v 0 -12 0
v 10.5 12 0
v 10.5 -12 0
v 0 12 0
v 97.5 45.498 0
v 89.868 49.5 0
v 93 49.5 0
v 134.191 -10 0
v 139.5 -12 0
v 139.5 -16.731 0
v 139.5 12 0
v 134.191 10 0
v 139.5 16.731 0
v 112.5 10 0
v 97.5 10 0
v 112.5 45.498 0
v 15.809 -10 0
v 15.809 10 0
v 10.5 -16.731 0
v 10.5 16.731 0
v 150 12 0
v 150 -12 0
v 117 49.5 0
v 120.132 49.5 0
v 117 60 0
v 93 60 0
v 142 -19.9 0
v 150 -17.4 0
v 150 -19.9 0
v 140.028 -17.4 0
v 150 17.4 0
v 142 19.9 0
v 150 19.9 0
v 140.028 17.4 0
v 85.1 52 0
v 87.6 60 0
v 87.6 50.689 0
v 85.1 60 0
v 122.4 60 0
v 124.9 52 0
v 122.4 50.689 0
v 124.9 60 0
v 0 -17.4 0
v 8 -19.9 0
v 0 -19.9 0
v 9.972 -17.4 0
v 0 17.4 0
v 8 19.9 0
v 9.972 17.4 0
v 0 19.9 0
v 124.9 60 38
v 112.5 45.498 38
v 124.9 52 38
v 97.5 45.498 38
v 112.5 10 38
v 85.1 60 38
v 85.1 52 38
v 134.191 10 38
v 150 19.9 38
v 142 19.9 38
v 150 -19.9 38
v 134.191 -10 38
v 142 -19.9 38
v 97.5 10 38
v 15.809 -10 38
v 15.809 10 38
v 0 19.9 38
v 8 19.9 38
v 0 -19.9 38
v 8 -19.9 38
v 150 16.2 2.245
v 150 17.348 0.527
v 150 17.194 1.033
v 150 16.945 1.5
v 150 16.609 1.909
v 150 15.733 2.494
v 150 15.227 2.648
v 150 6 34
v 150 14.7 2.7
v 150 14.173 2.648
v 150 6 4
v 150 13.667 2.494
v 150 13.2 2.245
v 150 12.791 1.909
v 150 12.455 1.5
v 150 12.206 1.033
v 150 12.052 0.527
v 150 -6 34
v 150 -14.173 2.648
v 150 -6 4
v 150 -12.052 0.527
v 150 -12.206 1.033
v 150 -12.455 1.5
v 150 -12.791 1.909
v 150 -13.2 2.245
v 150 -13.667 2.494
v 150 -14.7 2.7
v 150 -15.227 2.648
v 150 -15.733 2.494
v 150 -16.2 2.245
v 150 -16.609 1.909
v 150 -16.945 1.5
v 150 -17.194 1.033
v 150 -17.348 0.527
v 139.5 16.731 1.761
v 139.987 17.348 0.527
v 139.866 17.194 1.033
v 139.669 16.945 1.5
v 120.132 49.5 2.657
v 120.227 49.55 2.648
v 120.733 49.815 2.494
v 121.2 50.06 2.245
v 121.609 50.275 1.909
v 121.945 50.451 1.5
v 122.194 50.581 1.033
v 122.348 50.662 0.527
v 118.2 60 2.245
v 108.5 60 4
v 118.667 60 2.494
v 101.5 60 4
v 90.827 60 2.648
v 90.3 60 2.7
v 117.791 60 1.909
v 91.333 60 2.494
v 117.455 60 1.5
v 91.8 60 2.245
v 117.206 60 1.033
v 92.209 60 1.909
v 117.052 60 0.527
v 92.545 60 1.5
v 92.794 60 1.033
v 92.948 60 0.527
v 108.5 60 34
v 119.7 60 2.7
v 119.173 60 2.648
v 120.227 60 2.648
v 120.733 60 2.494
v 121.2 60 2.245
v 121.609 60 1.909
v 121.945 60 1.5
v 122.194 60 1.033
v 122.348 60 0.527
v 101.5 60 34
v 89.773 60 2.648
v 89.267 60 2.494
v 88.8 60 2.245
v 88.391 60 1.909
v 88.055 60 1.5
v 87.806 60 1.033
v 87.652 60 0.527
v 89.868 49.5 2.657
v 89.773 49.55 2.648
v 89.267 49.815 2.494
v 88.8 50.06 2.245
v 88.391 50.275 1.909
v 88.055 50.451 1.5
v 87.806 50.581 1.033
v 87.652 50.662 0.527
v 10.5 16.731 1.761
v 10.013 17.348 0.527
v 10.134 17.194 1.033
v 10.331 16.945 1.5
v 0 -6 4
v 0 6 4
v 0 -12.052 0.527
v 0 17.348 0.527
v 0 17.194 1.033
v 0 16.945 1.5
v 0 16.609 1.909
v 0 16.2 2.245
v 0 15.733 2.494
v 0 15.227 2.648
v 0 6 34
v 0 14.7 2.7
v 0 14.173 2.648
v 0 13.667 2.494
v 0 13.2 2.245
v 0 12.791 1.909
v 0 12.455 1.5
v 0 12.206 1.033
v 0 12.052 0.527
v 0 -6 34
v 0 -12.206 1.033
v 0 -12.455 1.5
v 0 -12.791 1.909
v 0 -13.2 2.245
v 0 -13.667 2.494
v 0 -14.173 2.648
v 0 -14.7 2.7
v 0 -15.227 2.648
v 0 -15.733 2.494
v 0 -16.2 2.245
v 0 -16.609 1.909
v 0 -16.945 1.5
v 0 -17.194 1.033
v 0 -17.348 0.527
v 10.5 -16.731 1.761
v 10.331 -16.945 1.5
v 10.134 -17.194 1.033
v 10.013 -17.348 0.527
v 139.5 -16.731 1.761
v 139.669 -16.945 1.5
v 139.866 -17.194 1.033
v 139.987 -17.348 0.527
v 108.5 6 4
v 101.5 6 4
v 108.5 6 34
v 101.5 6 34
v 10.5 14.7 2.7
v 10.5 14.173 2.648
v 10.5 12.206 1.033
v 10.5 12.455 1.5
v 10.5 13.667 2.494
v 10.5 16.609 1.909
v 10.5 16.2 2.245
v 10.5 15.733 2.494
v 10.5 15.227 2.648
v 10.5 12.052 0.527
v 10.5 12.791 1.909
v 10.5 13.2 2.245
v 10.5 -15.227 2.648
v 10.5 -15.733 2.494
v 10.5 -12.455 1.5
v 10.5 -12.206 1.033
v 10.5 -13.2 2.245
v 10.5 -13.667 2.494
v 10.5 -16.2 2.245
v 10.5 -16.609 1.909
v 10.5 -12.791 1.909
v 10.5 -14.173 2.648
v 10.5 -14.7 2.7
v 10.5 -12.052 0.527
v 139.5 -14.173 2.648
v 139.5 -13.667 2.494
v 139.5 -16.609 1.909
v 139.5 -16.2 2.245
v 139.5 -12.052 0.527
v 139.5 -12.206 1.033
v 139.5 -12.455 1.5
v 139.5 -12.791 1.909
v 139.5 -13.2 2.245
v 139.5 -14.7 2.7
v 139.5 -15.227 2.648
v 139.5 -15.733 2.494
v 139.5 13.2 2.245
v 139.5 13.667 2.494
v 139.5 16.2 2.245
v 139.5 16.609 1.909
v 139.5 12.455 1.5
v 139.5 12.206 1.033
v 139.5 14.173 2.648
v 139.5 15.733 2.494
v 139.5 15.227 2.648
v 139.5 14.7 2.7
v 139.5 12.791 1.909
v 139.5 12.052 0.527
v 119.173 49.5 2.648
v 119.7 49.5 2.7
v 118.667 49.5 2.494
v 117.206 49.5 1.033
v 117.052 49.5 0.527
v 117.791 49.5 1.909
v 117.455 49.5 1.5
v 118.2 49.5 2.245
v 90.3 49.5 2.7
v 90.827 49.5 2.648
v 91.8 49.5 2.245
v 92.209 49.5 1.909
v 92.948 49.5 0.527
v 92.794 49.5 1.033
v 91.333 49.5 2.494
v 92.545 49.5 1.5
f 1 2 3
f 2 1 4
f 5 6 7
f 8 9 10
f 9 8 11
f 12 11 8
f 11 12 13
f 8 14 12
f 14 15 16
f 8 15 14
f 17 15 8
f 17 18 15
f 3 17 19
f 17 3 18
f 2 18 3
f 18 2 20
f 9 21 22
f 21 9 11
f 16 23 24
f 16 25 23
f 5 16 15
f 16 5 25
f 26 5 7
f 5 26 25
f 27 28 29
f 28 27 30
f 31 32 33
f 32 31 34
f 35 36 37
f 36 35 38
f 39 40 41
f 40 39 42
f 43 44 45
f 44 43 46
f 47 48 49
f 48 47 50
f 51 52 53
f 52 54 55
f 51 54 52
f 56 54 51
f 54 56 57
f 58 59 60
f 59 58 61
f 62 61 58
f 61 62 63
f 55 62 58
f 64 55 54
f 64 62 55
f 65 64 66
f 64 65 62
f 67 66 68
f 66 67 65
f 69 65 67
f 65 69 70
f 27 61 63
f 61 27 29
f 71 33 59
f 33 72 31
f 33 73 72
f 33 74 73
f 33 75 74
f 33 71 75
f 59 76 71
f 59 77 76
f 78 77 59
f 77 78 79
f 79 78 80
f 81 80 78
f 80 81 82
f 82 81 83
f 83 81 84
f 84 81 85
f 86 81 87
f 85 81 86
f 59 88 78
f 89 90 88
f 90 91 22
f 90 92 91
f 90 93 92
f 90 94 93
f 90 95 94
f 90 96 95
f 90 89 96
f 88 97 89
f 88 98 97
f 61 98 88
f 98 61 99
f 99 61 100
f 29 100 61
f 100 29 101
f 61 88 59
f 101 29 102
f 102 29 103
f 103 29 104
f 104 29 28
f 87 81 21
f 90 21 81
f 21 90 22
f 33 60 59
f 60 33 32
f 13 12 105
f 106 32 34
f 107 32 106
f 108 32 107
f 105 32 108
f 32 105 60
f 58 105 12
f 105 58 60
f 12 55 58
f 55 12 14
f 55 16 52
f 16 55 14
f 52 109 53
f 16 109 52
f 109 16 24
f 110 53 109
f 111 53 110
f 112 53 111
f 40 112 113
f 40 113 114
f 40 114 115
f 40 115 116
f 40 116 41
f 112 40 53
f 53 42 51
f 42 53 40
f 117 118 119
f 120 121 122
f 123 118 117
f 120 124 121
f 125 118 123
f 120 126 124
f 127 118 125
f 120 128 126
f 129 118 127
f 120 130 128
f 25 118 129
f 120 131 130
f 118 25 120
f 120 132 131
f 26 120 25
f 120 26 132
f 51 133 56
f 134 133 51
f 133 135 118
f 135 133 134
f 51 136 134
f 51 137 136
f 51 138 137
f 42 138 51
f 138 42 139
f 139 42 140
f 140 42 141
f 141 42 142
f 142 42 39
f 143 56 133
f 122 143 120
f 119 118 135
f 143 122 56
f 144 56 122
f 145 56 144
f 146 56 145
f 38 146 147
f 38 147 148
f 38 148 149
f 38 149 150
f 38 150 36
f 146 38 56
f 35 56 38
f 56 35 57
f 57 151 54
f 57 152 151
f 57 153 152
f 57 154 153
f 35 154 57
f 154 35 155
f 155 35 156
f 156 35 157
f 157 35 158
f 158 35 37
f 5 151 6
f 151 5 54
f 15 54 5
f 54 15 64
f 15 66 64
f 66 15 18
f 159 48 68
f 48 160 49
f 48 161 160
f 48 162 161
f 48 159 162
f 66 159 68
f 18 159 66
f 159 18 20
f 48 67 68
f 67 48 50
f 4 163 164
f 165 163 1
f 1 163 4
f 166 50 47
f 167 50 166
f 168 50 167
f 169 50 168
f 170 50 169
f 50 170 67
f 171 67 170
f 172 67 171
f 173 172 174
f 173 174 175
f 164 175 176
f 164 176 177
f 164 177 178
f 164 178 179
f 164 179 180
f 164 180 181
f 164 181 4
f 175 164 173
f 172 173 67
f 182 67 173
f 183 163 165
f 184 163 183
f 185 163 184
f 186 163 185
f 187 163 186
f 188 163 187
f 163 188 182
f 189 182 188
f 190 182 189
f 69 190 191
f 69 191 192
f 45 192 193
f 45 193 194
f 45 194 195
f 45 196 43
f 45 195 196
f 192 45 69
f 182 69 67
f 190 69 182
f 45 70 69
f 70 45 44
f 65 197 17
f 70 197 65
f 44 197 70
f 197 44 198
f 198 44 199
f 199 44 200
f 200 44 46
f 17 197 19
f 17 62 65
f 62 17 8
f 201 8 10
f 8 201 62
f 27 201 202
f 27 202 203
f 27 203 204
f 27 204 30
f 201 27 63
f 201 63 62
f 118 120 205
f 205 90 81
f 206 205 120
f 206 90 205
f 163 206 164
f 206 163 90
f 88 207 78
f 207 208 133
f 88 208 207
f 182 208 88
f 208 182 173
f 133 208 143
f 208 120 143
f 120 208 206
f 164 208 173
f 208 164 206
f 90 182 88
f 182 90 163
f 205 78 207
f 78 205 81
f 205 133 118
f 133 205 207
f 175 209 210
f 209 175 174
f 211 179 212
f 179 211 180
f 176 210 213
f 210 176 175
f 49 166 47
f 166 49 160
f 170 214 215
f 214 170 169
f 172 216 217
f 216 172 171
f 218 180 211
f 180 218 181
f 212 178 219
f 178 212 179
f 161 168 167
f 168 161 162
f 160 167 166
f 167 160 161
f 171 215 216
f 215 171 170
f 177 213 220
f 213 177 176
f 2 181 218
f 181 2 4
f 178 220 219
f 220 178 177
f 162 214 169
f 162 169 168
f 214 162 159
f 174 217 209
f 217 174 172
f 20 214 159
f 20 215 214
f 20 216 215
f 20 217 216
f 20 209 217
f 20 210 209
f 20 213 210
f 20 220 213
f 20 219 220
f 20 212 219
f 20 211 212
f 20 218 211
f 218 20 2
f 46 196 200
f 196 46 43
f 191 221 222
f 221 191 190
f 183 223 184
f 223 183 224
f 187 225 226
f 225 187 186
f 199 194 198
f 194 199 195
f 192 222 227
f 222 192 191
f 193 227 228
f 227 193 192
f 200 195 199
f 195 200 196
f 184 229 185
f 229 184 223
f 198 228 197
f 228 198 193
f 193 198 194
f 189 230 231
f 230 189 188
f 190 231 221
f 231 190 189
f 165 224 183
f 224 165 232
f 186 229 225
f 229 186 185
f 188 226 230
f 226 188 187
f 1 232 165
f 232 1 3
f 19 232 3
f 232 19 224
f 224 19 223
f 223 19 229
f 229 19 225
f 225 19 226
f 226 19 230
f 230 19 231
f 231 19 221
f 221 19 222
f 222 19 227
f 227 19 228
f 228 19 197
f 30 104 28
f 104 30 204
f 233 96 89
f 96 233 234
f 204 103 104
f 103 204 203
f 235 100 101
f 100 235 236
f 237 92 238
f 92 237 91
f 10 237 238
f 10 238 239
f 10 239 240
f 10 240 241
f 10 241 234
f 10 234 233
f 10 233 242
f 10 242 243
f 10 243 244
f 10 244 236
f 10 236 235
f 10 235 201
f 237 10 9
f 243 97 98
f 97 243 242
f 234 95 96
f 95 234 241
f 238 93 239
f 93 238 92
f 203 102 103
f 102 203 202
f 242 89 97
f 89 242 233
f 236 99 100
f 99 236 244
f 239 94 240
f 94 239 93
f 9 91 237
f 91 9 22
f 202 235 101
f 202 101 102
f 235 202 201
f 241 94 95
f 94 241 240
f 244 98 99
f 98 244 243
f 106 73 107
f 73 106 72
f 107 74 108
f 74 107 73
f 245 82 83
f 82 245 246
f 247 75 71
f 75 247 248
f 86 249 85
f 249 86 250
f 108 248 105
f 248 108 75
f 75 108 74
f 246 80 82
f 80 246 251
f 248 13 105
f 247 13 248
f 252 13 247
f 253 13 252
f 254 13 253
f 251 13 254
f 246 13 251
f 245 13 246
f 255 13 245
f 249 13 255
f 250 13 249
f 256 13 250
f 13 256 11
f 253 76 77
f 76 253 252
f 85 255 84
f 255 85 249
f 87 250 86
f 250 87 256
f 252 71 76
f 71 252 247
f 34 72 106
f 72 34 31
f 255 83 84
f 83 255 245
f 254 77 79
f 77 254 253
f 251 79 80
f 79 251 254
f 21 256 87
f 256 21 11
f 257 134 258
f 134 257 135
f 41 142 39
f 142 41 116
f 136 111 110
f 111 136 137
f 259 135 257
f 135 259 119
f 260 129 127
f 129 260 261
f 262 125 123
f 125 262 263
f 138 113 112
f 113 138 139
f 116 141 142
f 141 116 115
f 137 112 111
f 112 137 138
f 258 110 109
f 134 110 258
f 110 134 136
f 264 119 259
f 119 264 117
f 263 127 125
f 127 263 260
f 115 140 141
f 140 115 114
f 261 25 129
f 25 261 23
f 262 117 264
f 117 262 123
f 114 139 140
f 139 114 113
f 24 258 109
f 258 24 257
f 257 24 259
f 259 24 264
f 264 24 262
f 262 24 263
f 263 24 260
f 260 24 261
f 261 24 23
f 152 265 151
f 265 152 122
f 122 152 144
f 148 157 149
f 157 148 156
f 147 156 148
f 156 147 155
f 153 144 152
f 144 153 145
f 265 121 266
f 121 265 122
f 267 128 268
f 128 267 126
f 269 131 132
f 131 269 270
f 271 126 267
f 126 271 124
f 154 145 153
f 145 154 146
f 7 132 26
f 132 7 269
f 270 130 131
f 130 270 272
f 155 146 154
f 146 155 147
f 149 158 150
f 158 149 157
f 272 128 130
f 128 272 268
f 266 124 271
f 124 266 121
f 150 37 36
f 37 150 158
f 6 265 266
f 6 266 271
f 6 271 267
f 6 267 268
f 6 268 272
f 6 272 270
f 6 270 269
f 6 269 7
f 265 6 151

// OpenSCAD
$fn = 32;

// ----------------------------------------------------------------------
// Air duct: 20 mm duct, 4 mm wall, 38 mm across
// ----------------------------------------------------------------------

// --- parameters (mm) ---
duct_r = 10;              // duct core radius
duct_d = 20;              // duct core diameter
wall = 4;                 // duct wall thickness
height = 38;              // duct width (extrusion height)
port_r = 19.9;            // port flange half width
port_d = 39.8;            // port flange width
port_t = 8;               // port flange thickness
bolt_d = 5.4;             // port bolt holes
bolt_offset = 14.7;       // bolt hole offset from the port axis
branch_r = 7.5;           // branch core radius
branch_d = 15;            // branch core diameter
branch_len = 60;          // branch length from the run axis

difference() {
  /* outer hull chain: tube with a flat flange plate at every port */
  linear_extrude(height = 38) {
    hull() {
      polygon([[0, -19.9], [0, 19.9], [8, 19.9], [8, -19.9]]);
      translate([11, 0]) circle(r = 10);
    }
    hull() {
      translate([11, 0]) circle(r = 10);
      translate([45, 0]) circle(r = 10);
    }
    hull() {
      translate([45, 0]) circle(r = 10);
      translate([105, 0]) circle(r = 10);
    }
    hull() {
      translate([105, 0]) circle(r = 10);
      translate([139, 0]) circle(r = 10);
    }
    hull() {
      translate([139, 0]) circle(r = 10);
      polygon([[150, 19.9], [150, -19.9], [142, -19.9], [142, 19.9]]);
    }
    hull() {
      translate([105, 0]) circle(r = 7.5);
      translate([105, 33]) circle(r = 7.5);
    }
    hull() {
      translate([105, 33]) circle(r = 7.5);
      translate([105, 50]) circle(r = 7.5);
    }
    hull() {
      translate([105, 50]) circle(r = 7.5);
      polygon([[85.1, 60], [124.9, 60], [124.9, 52], [85.1, 52]]);
    }
  }
  /* air passage: the same chain inset by the wall, 5 mm proud of the ports */
  translate([0, 0, 4]) linear_extrude(height = 30) {
    hull() {
      translate([-5, 0]) circle(r = 6);
      translate([45, 0]) circle(r = 6);
    }
    hull() {
      translate([45, 0]) circle(r = 6);
      translate([105, 0]) circle(r = 6);
    }
    hull() {
      translate([105, 0]) circle(r = 6);
      translate([155, 0]) circle(r = 6);
    }
    hull() {
      translate([105, 0]) circle(r = 3.5);
      translate([105, 33]) circle(r = 3.5);
    }
    hull() {
      translate([105, 33]) circle(r = 3.5);
      translate([105, 65]) circle(r = 3.5);
    }
  }
  translate([0, 0]) rotate([0, 0, -90]) translate([-14.7, -2.5]) rotate([-90, 0, 0]) cylinder(h = 13, d = 5.4);
  translate([0, 0]) rotate([0, 0, -90]) translate([14.7, -2.5]) rotate([-90, 0, 0]) cylinder(h = 13, d = 5.4);
  translate([150, 0]) rotate([0, 0, 90]) translate([-14.7, -2.5]) rotate([-90, 0, 0]) cylinder(h = 13, d = 5.4);
  translate([150, 0]) rotate([0, 0, 90]) translate([14.7, -2.5]) rotate([-90, 0, 0]) cylinder(h = 13, d = 5.4);
  translate([105, 60]) rotate([0, 0, 180]) translate([-14.7, -2.5]) rotate([-90, 0, 0]) cylinder(h = 13, d = 5.4);
  translate([105, 60]) rotate([0, 0, 180]) translate([14.7, -2.5]) rotate([-90, 0, 0]) cylinder(h = 13, d = 5.4);
}
